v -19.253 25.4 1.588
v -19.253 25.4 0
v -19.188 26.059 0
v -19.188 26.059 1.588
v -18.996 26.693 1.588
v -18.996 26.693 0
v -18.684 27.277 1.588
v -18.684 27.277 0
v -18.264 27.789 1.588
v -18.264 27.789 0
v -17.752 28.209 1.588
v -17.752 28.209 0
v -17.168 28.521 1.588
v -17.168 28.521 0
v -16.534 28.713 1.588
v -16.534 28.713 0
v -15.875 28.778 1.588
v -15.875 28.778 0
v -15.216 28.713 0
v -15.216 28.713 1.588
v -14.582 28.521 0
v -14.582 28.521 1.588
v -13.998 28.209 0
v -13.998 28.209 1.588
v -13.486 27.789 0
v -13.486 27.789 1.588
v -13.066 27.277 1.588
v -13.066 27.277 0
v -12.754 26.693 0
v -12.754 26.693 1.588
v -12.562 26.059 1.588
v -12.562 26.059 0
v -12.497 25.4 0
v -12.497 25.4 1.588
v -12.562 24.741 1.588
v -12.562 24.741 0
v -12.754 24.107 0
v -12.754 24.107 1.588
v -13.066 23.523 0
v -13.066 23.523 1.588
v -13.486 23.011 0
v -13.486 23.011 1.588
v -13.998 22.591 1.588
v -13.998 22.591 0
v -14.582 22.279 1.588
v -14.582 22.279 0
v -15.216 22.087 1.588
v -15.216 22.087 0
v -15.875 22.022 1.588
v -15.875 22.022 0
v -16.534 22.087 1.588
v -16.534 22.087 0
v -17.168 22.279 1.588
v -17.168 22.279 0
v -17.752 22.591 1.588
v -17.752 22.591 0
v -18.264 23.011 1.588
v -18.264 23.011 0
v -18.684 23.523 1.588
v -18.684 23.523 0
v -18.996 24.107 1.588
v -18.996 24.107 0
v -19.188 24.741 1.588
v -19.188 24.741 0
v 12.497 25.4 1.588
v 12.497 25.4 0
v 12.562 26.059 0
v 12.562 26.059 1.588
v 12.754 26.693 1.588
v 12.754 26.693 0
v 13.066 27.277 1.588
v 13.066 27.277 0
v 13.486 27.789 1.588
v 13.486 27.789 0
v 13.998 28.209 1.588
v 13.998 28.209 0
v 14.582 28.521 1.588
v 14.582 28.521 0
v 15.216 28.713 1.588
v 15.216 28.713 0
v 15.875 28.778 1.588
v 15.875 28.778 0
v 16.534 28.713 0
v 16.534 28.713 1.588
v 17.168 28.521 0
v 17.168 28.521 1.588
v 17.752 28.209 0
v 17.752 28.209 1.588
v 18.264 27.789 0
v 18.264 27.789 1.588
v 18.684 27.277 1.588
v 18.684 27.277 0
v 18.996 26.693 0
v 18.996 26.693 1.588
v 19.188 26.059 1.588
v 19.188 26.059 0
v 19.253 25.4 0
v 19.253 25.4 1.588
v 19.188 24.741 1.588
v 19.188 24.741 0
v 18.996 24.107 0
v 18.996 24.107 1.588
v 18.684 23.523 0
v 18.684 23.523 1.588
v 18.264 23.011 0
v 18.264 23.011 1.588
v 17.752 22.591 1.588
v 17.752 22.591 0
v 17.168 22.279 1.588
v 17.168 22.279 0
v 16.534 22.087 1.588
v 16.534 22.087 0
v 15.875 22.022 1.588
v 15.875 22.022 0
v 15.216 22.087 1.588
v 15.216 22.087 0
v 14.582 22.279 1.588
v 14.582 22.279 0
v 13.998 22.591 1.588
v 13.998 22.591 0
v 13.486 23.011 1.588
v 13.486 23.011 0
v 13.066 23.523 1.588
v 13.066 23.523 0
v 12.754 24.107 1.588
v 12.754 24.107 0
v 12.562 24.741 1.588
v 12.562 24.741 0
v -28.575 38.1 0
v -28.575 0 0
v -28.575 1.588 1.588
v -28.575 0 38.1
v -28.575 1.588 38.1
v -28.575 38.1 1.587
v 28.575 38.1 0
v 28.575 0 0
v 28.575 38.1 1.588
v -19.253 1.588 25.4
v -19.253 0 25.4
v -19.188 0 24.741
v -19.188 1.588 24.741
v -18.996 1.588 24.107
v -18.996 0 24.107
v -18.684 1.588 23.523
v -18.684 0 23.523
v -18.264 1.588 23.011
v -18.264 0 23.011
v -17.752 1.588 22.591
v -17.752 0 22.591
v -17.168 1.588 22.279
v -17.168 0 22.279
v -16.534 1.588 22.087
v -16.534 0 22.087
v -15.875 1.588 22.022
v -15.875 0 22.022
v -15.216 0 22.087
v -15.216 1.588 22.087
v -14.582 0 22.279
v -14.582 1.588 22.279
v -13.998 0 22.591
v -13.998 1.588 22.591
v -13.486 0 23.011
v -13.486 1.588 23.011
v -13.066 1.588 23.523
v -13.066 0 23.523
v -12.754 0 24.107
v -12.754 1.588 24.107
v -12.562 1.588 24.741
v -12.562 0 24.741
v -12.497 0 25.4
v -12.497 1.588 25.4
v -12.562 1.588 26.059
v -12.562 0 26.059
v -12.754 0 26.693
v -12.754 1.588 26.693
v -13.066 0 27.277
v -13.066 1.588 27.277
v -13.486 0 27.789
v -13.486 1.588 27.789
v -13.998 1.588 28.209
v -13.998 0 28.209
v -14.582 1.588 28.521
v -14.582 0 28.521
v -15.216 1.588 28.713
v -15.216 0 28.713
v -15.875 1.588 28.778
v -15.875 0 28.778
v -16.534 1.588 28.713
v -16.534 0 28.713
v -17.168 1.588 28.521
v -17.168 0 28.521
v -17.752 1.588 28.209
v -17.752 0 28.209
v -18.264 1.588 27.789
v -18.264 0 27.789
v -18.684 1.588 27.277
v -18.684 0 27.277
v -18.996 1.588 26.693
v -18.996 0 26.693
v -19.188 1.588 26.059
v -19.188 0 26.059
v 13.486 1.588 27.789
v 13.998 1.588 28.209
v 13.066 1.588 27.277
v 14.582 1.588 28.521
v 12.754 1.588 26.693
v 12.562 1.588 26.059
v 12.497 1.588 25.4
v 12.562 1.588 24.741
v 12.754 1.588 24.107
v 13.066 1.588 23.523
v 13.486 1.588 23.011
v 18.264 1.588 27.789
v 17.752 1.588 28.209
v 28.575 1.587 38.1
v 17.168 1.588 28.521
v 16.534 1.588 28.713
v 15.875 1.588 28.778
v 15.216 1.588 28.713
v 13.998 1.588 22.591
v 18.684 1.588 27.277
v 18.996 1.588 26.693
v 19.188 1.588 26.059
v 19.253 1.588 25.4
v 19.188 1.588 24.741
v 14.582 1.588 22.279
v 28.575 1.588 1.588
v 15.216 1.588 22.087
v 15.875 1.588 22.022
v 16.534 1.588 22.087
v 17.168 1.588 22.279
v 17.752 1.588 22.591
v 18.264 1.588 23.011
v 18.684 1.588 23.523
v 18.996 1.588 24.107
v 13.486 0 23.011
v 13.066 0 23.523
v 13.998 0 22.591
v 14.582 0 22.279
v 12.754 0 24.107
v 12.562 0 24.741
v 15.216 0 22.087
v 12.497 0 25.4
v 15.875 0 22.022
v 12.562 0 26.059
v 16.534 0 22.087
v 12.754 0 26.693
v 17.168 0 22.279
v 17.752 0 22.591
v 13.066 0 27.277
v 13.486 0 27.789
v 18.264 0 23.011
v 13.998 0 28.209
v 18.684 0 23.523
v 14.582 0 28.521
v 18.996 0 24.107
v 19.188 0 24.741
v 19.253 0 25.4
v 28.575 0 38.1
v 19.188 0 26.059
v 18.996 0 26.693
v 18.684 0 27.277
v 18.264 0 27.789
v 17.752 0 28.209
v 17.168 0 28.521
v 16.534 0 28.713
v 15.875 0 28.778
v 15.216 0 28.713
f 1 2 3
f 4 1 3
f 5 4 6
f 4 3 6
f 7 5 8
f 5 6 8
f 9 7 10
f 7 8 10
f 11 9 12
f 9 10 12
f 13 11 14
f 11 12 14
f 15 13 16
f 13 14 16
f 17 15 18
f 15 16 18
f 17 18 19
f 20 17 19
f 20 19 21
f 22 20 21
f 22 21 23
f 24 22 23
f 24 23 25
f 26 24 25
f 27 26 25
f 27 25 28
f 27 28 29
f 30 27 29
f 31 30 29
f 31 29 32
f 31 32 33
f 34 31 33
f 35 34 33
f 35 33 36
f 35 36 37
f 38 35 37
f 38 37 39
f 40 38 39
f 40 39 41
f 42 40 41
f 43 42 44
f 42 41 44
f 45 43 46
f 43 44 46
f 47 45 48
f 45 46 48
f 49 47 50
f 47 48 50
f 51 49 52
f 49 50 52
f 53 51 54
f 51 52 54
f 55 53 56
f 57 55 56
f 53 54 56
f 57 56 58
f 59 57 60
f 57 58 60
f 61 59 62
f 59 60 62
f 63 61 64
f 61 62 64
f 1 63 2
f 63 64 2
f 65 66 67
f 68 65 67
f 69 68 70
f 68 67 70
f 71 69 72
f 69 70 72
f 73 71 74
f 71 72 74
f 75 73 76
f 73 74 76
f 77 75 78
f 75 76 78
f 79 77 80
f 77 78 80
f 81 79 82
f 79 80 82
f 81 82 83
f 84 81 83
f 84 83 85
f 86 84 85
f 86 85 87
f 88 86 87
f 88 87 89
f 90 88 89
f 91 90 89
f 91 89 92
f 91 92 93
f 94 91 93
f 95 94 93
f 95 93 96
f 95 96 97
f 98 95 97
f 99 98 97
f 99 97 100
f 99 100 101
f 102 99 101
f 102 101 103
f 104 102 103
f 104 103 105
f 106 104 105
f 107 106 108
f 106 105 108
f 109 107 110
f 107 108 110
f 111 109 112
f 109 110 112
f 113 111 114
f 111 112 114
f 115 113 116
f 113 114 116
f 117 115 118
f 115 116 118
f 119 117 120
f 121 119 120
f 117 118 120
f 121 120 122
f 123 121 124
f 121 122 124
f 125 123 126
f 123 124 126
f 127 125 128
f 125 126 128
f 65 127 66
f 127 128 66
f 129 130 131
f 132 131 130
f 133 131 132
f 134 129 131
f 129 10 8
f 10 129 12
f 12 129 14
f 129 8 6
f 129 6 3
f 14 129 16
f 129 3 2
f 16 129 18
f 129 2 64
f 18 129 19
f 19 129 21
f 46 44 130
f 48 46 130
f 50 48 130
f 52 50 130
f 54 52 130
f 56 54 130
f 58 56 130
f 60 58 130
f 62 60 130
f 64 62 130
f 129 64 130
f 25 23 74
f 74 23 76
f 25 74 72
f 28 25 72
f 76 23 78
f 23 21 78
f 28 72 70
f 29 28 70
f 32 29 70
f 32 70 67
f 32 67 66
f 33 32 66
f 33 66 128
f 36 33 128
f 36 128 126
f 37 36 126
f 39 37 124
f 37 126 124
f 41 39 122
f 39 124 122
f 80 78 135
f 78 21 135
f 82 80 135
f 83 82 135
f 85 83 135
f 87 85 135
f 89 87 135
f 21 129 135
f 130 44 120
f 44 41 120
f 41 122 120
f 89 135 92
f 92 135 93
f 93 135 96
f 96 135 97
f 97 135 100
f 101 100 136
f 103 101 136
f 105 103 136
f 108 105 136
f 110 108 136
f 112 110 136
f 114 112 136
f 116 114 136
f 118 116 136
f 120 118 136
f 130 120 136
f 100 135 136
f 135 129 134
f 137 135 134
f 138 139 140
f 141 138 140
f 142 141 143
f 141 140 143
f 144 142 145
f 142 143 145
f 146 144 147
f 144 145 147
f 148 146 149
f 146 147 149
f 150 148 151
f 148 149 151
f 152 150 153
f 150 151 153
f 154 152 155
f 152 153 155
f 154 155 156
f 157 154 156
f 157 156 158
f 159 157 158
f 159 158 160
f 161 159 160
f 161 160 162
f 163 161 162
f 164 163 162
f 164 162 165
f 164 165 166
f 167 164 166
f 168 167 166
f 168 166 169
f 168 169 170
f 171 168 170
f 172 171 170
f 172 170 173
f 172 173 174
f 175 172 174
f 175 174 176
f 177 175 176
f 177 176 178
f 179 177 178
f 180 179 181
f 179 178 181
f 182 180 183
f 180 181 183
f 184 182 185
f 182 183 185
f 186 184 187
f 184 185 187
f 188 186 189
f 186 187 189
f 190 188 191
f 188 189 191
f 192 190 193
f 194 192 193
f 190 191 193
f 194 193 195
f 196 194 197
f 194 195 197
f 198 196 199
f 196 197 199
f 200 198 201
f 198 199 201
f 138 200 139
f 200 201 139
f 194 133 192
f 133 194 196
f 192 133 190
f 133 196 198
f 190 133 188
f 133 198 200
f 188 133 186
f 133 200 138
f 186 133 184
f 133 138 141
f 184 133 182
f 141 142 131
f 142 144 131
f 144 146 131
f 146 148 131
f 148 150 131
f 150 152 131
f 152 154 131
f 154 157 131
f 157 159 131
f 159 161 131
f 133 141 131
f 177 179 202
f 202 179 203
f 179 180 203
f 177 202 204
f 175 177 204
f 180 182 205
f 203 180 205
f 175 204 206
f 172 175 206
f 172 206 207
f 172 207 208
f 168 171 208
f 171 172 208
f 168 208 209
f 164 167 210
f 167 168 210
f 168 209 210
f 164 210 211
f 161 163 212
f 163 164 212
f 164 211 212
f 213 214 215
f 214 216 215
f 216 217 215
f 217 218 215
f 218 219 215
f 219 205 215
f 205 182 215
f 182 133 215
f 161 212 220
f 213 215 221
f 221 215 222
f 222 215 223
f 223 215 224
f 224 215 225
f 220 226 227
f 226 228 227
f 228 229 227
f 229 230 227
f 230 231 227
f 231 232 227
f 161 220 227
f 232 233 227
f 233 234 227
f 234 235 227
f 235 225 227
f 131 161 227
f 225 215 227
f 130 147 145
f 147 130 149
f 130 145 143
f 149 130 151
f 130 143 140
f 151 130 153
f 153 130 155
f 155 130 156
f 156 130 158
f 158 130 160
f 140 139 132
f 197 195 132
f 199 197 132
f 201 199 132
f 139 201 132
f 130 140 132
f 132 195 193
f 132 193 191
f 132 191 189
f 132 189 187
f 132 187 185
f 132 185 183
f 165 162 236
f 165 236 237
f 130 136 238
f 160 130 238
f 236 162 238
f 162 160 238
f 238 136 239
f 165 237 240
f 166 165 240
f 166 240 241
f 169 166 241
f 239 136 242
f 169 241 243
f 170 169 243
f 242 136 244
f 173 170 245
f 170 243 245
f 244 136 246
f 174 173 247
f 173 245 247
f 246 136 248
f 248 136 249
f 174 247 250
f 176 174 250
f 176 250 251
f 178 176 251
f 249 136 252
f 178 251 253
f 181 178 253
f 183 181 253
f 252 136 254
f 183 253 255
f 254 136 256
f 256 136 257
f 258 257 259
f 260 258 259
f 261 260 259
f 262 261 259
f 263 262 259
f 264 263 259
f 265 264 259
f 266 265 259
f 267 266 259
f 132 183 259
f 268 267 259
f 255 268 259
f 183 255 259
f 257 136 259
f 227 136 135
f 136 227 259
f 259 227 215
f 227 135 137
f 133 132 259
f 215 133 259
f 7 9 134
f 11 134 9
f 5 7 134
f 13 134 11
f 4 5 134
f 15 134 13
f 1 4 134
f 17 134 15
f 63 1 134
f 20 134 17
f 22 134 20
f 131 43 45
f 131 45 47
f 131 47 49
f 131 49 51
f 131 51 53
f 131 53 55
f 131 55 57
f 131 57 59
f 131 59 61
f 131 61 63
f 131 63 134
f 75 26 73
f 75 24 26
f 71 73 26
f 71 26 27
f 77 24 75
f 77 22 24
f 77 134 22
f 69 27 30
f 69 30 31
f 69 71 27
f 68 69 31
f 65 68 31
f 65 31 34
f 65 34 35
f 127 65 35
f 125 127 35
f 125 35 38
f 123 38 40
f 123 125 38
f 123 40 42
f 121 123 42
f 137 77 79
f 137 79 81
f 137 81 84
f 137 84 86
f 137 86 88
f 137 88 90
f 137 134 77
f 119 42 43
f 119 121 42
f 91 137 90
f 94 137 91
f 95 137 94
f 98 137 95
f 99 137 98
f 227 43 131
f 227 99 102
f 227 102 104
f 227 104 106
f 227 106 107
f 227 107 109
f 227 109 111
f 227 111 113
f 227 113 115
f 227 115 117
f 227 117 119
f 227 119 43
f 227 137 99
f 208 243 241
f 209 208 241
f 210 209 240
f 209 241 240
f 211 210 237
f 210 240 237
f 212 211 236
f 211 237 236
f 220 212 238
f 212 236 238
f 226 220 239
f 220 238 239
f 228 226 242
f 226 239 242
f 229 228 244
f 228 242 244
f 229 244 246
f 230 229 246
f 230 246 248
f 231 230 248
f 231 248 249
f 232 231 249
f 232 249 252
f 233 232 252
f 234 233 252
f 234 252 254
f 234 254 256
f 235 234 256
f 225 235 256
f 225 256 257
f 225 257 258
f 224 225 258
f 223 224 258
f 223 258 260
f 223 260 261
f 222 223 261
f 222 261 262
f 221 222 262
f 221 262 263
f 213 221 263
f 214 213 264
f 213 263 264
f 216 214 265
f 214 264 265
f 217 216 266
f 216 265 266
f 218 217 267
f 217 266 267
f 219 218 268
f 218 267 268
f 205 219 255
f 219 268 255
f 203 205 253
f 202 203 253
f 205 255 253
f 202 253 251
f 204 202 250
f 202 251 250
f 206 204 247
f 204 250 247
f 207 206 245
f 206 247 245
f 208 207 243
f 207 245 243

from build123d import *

# Parameters (mm, degrees)
SKETCH1_W                    = 57.15
SKETCH1_H                    = 38.1
BASE_FLANGE1_DEPTH           = 1.5875
EDGE_FLANGE1_STRIP_W         = 7.9375
EDGE_FLANGE1_STRIP_H         = 1.5875
EDGE_FLANGE1_STRIP_CUT_DEPTH = 57.15
EDGE_FLANGE1_DEPTH           = 57.15
F_1_4_CLEARANCE_HOLE1_D      = 6.7564
F_1_4_CLEARANCE_HOLE2_D      = 6.7564
BOSS_EXTRUDE1_DEPTH          = 57.15
CUT_EXTRUDE1_DEPTH           = 79.545162168
BOSS_EXTRUDE2_DEPTH          = 3.175
BOSS_EXTRUDE3_DEPTH          = 3.175


# Sheet-metal steps are written as plain solids
with BuildPart() as part:
    # Sketch1 → Base-Flange1 (new body)
    with BuildSketch(Plane(origin=(0, 0, 0), x_dir=(1, 0, 0), z_dir=(0, 1, 0))):
        with Locations((0, -19.05)):
            Rectangle(SKETCH1_W, SKETCH1_H)
    extrude(amount=BASE_FLANGE1_DEPTH)

    # Edge-Flange1 strip (across the edge) → Edge-Flange1 strip cut (cut)
    with BuildSketch(Plane(origin=(28.575, 1.5875, 0), x_dir=(0, 0, 1), z_dir=(-1, 0, 0))):
        with Locations((-1.5875, -0.79375)):
            Rectangle(EDGE_FLANGE1_STRIP_W, EDGE_FLANGE1_STRIP_H)
    extrude(amount=EDGE_FLANGE1_STRIP_CUT_DEPTH, mode=Mode.SUBTRACT)

    # Edge-Flange1 section (across the edge) → Edge-Flange1 (add)
    with BuildSketch(Plane(origin=(28.575, 1.5875, 0), x_dir=(0, 0, 1), z_dir=(-1, 0, 0))):
        with BuildLine():
            Line((0, 0.79375), (0, 36.5125))
            Line((0, 36.5125), (1.5875, 36.5125))
            Line((1.5875, 36.5125), (1.5875, 0.79375))
            ThreePointArc((1.5875, 0.79375), (1.819983992, 0.232483992), (2.38125, 0))
            Line((2.38125, 0), (2.38125, -1.5875))
            ThreePointArc((2.38125, -1.5875), (0.697451977, -0.890048023), (0, 0.79375))
        make_face()
    extrude(amount=EDGE_FLANGE1_DEPTH)

    # 1/4 Clearance Hole1 (through all)
    with Locations(Plane(origin=(0, 1.5875, 0), x_dir=(1, 0, 0), z_dir=(0, 1, 0))):
        with Locations((-15.875, -25.4), (15.875, -25.4)):
            Hole(F_1_4_CLEARANCE_HOLE1_D / 2)

    # 1/4 Clearance Hole2 (through all)
    with Locations(Plane.XY.offset(1.5875)):
        with Locations((-15.875, 25.4), (15.875, 25.4)):
            Hole(F_1_4_CLEARANCE_HOLE2_D / 2)

    # Sketch16 → Boss-Extrude1 (add, through all)
    with BuildSketch(Plane(origin=(28.575, 0, 0), x_dir=(0, 0, -1), z_dir=(1, 0, 0))):
        with BuildLine():
            Line((0, 2.38125), (0, 0))
            Line((0, 0), (-2.38125, 0))
            ThreePointArc((-2.38125, 0), (-0.697451977, 0.697451977), (0, 2.38125))
        make_face()
    extrude(amount=-BOSS_EXTRUDE1_DEPTH)

    # Sketch18 → Cut-Extrude1 (cut, through all)
    with BuildSketch(Plane(origin=(28.575, 0, 0), x_dir=(0, 0, -1), z_dir=(1, 0, 0))):
        with BuildLine():
            Line((-2.38125, 1.5875), (-1.5875, 1.5875))
            Line((-1.5875, 1.5875), (-1.5875, 2.38125))
            ThreePointArc((-1.5875, 2.38125), (-1.819983992, 1.819983992), (-2.38125, 1.5875))
        make_face()
    extrude(amount=-CUT_EXTRUDE1_DEPTH, mode=Mode.SUBTRACT)

    # Sketch21 → Boss-Extrude2 (add)
    with BuildSketch(Plane(origin=(28.575, 0, 0), x_dir=(0, 0, -1), z_dir=(1, 0, 0))):
        Polygon((-1.5875, 1.5875), (-38.1, 1.5875), (-38.1, 0), (0, 0), (0, 38.1), (-1.5875, 38.1), align=None)
    extrude(amount=-BOSS_EXTRUDE2_DEPTH)

    # Sketch22 → Boss-Extrude3 (add)
    with BuildSketch(Plane.ZY.offset(28.575)):
        Polygon((38.1, 1.5875), (1.5875, 1.5875), (1.5875, 38.1), (0, 38.1), (0, 0), (38.1, 0), align=None)
    extrude(amount=-BOSS_EXTRUDE3_DEPTH)


solid = part.part
